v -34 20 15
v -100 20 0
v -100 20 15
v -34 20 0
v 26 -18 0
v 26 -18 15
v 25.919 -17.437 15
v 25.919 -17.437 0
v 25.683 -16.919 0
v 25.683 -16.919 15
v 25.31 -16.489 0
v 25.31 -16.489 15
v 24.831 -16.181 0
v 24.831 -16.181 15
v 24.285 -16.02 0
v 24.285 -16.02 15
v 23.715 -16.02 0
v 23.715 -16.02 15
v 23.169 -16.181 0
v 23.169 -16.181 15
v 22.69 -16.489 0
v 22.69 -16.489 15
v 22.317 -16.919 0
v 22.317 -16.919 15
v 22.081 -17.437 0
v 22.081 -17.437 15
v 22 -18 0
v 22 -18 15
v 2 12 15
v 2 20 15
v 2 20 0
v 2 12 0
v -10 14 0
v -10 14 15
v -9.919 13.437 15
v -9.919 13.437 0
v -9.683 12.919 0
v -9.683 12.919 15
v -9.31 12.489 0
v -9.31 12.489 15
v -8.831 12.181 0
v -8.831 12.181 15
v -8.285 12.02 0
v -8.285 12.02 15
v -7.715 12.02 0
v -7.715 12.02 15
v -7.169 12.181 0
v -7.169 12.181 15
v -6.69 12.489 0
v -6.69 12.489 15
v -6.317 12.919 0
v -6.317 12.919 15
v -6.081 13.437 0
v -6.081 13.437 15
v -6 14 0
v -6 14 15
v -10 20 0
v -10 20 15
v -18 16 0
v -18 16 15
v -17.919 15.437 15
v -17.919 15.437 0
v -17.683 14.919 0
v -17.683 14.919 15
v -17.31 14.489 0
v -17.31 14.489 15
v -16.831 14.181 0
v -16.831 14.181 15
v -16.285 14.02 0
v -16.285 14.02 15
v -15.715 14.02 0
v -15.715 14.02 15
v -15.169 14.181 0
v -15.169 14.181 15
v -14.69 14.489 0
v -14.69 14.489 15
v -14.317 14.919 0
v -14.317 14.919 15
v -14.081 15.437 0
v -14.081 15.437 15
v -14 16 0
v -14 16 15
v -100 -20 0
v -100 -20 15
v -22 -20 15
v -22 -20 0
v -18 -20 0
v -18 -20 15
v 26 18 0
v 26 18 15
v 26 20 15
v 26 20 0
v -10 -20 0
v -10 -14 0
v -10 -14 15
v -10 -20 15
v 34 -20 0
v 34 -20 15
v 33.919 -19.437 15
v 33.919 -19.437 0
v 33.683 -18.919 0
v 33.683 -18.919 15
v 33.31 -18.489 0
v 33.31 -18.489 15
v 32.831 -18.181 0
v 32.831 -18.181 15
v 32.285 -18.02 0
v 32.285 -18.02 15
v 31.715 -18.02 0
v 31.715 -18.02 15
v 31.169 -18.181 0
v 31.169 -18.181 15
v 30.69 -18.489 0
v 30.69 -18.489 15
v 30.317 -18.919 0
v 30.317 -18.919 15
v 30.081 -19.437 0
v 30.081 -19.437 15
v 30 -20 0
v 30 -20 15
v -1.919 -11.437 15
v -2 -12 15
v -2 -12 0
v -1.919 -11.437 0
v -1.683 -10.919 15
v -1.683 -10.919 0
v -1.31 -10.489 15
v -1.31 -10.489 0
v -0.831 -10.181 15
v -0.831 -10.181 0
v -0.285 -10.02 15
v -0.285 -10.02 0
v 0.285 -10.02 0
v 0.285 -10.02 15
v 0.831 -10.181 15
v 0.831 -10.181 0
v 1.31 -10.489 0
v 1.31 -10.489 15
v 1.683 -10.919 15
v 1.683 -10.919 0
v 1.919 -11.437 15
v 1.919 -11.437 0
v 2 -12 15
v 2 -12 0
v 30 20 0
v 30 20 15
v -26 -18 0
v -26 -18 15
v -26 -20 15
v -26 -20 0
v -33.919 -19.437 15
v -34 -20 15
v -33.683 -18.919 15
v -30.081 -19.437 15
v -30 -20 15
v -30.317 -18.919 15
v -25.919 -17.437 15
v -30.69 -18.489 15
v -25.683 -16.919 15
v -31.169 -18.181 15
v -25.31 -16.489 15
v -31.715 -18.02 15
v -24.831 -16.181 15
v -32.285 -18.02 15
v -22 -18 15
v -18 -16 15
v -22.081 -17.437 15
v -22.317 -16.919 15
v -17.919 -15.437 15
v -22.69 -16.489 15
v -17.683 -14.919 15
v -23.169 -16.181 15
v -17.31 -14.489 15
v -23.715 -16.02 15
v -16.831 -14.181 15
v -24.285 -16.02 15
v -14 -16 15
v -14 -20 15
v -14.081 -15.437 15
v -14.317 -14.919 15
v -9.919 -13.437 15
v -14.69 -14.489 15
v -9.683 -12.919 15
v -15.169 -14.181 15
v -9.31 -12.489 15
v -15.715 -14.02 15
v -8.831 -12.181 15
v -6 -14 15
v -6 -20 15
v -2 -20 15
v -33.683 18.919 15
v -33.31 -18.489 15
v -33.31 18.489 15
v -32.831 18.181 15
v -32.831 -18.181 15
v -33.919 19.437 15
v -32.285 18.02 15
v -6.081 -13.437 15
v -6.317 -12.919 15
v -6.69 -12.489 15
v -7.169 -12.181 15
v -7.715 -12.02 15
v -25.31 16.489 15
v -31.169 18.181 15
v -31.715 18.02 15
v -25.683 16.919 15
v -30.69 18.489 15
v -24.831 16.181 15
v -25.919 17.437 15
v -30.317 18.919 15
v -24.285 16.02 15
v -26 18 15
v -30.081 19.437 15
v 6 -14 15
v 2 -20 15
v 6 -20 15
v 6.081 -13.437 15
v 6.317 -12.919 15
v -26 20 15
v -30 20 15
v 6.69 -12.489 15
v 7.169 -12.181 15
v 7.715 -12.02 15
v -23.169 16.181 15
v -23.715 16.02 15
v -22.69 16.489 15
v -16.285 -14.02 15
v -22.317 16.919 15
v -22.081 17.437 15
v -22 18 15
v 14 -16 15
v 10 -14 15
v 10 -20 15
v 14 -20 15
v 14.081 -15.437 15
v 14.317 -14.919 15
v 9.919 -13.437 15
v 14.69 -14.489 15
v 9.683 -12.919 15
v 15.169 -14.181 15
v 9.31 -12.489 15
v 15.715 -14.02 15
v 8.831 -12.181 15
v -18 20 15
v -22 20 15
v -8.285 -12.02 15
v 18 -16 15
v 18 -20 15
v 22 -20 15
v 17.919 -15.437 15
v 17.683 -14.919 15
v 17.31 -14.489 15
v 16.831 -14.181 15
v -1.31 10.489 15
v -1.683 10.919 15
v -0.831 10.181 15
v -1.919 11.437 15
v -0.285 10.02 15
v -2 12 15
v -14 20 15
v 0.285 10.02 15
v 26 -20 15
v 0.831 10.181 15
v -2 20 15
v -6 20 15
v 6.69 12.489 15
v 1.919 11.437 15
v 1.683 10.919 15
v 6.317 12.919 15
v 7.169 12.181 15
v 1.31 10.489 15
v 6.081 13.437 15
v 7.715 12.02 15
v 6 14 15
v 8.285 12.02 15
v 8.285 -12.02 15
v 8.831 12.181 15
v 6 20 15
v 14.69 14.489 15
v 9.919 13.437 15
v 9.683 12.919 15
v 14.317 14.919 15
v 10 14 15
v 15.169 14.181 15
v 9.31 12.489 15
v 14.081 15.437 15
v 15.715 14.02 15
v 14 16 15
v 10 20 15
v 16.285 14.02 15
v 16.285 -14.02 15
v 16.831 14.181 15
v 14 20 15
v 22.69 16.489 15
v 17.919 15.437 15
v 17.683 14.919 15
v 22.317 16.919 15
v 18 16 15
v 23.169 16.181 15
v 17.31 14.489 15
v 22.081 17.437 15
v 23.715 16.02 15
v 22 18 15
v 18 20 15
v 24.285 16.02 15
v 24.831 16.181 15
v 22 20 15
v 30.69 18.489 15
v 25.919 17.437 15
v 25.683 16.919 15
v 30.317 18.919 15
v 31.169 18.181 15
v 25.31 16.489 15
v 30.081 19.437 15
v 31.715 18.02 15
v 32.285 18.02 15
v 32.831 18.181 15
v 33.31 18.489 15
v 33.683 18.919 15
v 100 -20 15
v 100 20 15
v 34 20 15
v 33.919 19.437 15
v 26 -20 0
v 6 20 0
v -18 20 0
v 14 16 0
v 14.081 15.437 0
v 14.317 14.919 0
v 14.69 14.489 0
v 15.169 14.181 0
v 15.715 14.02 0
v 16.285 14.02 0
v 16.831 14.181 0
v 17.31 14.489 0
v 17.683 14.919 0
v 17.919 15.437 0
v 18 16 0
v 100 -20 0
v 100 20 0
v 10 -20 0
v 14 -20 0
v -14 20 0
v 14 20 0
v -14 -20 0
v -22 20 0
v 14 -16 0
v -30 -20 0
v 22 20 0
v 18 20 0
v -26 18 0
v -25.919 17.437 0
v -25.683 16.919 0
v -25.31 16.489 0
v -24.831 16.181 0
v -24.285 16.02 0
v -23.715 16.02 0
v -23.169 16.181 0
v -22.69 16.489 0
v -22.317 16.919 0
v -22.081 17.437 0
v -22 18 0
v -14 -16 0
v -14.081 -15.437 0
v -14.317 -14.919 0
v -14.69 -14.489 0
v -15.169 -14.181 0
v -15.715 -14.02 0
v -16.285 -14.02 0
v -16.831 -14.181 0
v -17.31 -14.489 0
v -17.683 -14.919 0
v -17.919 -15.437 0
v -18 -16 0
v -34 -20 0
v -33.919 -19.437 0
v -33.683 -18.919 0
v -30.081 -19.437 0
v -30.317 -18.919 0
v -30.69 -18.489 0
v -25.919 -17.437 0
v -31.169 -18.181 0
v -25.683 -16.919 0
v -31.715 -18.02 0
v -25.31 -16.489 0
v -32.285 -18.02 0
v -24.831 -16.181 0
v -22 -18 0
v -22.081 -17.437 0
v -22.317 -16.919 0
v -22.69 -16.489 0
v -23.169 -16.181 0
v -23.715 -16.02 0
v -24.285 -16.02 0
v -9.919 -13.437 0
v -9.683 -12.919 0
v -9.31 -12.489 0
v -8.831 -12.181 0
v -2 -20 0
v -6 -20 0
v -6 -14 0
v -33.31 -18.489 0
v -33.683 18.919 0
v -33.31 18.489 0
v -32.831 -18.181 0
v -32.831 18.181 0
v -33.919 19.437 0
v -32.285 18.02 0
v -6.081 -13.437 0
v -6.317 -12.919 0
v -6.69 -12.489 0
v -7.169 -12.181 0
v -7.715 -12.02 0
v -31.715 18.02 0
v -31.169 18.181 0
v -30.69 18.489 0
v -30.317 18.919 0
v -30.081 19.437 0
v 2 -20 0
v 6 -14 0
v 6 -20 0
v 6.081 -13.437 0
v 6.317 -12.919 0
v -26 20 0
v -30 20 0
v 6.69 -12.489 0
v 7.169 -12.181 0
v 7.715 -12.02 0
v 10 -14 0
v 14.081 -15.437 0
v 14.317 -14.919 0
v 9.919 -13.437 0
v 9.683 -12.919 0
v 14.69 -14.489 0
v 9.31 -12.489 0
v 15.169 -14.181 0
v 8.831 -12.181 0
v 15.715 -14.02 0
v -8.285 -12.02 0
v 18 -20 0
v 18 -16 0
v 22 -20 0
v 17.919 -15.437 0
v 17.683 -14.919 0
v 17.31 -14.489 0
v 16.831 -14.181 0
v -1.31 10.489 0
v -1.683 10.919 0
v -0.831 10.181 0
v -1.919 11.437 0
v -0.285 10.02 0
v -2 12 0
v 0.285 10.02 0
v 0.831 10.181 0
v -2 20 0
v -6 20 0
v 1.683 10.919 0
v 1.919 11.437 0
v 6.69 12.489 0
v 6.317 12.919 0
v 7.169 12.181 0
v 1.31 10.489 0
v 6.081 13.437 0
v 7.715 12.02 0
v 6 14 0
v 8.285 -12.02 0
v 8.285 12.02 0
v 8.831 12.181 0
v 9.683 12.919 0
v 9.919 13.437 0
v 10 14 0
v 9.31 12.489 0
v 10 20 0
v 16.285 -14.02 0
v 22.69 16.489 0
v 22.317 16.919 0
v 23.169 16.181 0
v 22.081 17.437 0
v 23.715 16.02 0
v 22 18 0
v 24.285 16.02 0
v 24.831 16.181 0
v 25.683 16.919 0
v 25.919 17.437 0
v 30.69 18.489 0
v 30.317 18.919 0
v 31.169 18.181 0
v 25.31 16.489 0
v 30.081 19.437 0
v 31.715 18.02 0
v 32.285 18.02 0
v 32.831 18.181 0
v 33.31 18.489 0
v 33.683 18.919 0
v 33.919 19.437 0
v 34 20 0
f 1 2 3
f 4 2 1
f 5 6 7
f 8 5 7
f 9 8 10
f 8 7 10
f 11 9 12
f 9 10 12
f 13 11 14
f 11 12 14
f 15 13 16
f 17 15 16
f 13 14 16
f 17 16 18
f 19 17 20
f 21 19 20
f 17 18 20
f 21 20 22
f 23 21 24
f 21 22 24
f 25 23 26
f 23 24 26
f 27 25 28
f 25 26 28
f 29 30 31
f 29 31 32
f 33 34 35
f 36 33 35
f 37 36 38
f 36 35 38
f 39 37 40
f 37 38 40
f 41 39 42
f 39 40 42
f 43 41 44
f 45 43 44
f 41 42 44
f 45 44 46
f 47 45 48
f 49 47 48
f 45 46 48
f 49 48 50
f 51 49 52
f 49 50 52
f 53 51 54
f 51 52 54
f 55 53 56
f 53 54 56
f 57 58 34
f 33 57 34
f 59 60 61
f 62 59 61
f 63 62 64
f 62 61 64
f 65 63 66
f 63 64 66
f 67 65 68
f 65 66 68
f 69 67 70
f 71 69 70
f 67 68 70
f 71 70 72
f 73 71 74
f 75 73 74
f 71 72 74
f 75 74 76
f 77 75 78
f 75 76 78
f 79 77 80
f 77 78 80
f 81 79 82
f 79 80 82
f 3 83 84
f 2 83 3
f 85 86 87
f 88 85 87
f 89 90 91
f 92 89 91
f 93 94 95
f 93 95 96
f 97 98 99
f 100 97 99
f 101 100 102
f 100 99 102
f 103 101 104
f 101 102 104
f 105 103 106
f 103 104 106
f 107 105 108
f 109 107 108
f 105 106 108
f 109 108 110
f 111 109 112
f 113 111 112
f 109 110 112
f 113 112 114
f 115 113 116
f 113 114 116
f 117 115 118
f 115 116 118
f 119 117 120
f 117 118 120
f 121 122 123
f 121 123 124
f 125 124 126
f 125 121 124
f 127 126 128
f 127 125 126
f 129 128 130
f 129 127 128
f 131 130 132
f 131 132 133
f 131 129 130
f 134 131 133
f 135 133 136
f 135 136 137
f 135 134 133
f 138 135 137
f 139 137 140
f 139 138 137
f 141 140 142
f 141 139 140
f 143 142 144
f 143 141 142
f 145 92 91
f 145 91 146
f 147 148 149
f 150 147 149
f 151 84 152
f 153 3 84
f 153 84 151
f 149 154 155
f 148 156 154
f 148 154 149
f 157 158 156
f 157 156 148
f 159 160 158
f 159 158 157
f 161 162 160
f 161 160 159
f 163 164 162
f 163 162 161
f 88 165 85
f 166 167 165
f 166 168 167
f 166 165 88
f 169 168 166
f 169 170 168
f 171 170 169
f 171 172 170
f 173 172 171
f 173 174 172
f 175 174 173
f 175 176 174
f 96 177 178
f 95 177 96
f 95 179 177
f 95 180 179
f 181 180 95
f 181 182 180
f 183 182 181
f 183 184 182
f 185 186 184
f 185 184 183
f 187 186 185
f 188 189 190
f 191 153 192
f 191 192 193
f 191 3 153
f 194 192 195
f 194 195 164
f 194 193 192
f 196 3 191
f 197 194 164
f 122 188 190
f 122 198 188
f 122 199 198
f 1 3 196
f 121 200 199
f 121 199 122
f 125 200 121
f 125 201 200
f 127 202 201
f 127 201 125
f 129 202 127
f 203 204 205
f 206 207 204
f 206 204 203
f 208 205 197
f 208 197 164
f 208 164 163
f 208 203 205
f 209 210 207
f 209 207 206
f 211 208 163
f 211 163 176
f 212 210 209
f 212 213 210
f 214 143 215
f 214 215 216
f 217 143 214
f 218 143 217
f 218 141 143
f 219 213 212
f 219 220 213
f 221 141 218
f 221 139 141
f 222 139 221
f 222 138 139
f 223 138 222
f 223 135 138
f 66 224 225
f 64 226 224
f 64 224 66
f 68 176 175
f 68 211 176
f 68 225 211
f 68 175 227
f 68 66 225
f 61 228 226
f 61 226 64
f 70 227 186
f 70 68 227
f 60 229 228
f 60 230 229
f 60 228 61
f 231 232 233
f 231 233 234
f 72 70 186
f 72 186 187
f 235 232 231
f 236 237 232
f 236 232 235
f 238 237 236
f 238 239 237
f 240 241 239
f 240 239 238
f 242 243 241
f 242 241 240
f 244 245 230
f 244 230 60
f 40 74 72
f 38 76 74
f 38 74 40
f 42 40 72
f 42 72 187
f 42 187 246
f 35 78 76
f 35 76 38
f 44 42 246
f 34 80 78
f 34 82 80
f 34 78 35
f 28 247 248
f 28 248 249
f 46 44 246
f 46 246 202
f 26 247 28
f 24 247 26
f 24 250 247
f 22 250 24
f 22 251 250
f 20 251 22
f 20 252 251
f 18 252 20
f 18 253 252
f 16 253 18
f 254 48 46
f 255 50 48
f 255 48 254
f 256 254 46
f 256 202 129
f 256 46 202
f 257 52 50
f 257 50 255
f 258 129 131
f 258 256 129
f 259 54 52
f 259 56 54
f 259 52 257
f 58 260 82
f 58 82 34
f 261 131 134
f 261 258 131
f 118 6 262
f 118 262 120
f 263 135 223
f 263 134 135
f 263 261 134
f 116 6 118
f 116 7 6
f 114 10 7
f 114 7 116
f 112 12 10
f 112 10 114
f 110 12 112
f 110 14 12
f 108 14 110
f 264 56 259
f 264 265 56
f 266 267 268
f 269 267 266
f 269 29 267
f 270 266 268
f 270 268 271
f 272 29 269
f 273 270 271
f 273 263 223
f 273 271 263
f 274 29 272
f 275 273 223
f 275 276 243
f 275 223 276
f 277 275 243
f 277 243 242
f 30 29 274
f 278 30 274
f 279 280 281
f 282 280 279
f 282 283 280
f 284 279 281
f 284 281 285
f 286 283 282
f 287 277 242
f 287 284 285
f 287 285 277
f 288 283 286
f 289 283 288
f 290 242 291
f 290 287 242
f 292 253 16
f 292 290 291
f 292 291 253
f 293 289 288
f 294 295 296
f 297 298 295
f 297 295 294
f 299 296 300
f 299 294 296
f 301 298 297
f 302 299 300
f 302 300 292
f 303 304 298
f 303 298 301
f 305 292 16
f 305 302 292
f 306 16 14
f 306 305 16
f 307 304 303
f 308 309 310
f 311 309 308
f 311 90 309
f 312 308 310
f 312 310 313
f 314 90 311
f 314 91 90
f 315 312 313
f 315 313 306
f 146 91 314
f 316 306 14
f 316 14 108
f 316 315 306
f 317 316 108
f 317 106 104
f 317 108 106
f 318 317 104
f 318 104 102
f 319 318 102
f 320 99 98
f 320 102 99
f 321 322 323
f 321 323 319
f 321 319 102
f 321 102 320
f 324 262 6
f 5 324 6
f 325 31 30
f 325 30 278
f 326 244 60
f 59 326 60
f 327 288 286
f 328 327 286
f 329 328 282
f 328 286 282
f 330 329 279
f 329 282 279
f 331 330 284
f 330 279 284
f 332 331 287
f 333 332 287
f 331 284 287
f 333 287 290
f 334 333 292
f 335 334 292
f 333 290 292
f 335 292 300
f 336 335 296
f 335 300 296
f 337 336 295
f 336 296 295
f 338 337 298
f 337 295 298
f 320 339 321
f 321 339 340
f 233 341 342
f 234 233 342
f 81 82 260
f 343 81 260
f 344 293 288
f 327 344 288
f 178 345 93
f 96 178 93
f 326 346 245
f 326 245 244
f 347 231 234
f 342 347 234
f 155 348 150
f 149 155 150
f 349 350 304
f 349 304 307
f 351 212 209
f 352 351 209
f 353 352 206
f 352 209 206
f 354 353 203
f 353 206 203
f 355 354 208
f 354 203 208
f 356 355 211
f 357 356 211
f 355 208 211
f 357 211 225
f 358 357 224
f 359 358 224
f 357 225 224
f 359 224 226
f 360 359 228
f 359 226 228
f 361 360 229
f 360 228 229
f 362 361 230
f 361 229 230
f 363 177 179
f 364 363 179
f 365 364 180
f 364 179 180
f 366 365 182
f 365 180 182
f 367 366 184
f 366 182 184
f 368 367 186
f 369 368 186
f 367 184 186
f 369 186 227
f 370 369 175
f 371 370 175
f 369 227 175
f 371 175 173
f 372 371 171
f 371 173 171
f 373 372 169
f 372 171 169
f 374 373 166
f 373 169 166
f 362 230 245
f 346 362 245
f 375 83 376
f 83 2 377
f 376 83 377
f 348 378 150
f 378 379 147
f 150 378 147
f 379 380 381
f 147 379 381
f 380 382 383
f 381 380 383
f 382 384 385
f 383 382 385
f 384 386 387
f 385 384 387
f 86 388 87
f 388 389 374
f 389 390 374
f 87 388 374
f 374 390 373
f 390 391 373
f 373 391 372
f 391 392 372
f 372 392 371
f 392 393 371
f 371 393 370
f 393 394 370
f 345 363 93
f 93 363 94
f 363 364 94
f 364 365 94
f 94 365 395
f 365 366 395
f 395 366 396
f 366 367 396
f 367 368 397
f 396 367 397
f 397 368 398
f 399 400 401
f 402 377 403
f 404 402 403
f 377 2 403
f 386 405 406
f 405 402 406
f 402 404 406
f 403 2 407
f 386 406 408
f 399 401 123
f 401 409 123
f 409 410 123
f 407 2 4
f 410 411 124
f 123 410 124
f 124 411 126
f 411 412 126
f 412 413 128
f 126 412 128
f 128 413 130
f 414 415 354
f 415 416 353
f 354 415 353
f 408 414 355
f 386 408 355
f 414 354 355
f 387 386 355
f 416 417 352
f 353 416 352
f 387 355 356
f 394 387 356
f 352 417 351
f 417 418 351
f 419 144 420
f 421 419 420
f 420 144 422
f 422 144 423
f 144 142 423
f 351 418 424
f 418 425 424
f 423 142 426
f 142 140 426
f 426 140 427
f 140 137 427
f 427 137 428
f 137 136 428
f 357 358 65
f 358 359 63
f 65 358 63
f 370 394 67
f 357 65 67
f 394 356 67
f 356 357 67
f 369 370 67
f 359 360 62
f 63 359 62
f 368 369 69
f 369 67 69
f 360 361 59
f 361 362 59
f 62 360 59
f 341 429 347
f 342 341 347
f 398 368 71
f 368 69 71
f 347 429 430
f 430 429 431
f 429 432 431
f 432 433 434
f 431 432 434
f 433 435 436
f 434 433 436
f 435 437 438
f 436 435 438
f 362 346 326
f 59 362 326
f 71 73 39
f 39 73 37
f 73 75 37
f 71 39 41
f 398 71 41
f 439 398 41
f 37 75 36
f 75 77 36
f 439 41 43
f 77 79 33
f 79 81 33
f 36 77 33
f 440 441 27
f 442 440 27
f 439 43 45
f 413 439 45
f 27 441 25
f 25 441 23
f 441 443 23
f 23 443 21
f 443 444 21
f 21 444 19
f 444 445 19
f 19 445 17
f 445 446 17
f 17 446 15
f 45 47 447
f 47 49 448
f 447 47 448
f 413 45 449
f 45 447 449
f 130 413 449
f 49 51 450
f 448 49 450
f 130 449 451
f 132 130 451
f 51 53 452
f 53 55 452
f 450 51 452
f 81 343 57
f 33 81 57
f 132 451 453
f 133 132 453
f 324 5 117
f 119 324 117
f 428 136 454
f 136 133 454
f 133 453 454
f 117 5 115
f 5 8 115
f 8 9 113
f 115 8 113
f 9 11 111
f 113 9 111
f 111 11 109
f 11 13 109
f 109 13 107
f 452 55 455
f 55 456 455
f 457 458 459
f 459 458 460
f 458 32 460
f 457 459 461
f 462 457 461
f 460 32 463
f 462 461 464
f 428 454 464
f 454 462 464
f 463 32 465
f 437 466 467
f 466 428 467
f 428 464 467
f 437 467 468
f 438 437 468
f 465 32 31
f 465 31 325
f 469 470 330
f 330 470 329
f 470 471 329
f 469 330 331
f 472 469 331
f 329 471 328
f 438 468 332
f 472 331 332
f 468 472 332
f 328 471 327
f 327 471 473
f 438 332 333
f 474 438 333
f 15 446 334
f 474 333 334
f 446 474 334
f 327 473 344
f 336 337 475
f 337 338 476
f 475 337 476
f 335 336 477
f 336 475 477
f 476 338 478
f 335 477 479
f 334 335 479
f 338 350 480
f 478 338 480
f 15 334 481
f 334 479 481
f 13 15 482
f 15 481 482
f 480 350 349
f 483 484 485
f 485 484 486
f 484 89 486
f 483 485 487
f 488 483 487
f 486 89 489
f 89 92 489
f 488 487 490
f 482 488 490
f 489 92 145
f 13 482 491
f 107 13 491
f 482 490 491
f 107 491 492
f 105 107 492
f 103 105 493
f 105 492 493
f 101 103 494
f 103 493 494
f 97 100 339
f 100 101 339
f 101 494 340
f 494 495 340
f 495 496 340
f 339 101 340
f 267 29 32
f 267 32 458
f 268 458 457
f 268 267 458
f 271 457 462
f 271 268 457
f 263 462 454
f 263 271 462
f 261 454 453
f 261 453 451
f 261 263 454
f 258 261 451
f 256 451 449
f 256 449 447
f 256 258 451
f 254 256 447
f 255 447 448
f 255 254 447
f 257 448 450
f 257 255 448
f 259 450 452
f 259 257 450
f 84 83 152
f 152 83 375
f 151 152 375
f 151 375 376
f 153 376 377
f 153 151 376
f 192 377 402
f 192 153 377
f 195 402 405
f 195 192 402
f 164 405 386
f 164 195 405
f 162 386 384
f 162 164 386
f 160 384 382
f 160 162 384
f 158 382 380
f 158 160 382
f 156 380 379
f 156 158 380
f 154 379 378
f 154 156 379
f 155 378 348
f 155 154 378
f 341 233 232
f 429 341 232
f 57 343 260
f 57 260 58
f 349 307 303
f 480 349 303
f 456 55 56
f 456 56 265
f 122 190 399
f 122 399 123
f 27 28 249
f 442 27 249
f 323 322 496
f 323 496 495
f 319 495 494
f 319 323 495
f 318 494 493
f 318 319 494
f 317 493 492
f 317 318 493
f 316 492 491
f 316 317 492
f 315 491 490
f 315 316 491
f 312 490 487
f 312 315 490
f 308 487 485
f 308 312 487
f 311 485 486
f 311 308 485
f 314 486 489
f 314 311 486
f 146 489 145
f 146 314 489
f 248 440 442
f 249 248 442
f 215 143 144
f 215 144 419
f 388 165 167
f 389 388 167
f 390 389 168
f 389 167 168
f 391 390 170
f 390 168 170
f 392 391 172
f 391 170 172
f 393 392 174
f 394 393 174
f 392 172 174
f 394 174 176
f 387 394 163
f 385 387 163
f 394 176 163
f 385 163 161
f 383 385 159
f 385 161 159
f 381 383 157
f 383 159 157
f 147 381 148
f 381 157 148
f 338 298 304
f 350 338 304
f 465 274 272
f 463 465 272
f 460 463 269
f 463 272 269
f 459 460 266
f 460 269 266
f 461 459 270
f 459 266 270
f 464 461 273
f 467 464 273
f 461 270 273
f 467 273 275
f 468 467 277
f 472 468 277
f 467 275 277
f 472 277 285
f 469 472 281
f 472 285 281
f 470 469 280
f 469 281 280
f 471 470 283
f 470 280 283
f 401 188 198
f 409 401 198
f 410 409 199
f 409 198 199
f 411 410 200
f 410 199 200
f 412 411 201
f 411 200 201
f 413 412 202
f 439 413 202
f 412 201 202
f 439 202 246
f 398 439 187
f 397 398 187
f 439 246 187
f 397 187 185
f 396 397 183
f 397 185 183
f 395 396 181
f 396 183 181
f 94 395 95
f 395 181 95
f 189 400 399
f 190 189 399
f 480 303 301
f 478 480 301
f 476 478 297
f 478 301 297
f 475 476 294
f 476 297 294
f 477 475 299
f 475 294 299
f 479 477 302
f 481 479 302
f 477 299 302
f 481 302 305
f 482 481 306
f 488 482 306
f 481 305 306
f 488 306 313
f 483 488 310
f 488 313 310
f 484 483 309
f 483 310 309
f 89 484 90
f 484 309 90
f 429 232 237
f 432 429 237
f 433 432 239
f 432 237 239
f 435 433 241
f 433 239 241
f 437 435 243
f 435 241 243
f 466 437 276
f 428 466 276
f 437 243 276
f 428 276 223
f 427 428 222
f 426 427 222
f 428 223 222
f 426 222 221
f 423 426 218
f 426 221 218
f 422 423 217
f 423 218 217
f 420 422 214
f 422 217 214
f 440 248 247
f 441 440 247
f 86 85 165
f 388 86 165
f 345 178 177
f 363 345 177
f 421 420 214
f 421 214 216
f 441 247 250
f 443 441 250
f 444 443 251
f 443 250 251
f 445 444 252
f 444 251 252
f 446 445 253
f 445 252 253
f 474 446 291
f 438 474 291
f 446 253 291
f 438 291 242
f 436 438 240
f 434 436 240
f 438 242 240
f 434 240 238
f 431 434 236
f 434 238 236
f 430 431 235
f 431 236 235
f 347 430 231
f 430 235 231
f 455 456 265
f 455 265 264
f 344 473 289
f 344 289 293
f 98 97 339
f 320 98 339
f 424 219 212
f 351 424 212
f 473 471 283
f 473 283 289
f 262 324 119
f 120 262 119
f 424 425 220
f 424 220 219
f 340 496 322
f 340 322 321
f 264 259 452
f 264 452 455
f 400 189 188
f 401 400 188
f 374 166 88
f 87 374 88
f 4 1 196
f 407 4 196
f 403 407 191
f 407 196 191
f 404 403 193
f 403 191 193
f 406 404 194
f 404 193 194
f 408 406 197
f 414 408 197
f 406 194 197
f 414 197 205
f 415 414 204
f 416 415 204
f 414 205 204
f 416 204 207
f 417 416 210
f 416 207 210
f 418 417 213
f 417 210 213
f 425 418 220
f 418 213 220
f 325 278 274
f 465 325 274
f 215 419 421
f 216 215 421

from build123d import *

# Parameters (mm, degrees)
SKETCH1_W                                = 200
SKETCH1_H                                = 40
RECTANGULAR_BAR_40_W_X_200_L_X_15D_DEPTH = 15
NOTCH_CUT_OUT_DEPTH                      = 15
CUT_EXTRUDE1_DEPTH                       = 16


with BuildPart() as part:
    # Sketch1 → Rectangular Bar (40 W x 200 L x 15D) (new body)
    with BuildSketch(Plane.XY):
        Rectangle(SKETCH1_W, SKETCH1_H)
    extrude(amount=RECTANGULAR_BAR_40_W_X_200_L_X_15D_DEPTH)

    # Notch → Notch cut out (cut)
    with BuildSketch(Plane.XY.offset(15)):
        with BuildLine():
            Line((2, 20), (2, 12))
            ThreePointArc((2, 12), (0, 10), (-2, 12))
            Line((-2, 12), (-2, 20))
            Line((-2, 20), (2, 20))
        make_face()
        with BuildLine():
            Line((-2, -20), (-2, -12))
            ThreePointArc((-2, -12), (0, -10), (2, -12))
            Line((2, -12), (2, -20))
            Line((2, -20), (-2, -20))
        make_face()
    extrude(amount=-NOTCH_CUT_OUT_DEPTH, mode=Mode.SUBTRACT)

    # Sketch2 → Cut-Extrude1 (cut, through all)
    with BuildSketch(Plane.XY.offset(15)):
        with BuildLine():
            Line((6, 20), (6, 14))
            ThreePointArc((6, 14), (8, 12), (10, 14))
            Line((10, 14), (10, 20))
            Line((10, 20), (6, 20))
        make_face()
        with BuildLine():
            Line((14, 20), (14, 16))
            ThreePointArc((14, 16), (16, 14), (18, 16))
            Line((18, 16), (18, 20))
            Line((18, 20), (14, 20))
        make_face()
        with BuildLine():
            Line((22, 20), (22, 18))
            ThreePointArc((22, 18), (24, 16), (26, 18))
            Line((26, 18), (26, 20))
            Line((26, 20), (22, 20))
        make_face()
        with BuildLine():
            Line((30, 20), (34, 20))
            ThreePointArc((34, 20), (32, 18), (30, 20))
        make_face()
        with BuildLine():
            Line((-30, 20), (-34, 20))
            ThreePointArc((-34, 20), (-32, 18), (-30, 20))
        make_face()
        with BuildLine():
            Line((-22, 20), (-26, 20))
            Line((-26, 20), (-26, 18))
            ThreePointArc((-26, 18), (-24, 16), (-22, 18))
            Line((-22, 18), (-22, 20))
        make_face()
        with BuildLine():
            Line((-18, 20), (-18, 16))
            ThreePointArc((-18, 16), (-16, 14), (-14, 16))
            Line((-14, 16), (-14, 20))
            Line((-14, 20), (-18, 20))
        make_face()
        with BuildLine():
            Line((-10, 20), (-10, 14))
            ThreePointArc((-10, 14), (-8, 12), (-6, 14))
            Line((-6, 14), (-6, 20))
            Line((-6, 20), (-10, 20))
        make_face()
        with BuildLine():
            Line((30, -20), (34, -20))
            ThreePointArc((34, -20), (32, -18), (30, -20))
        make_face()
        with BuildLine():
            Line((26, -20), (26, -18))
            ThreePointArc((26, -18), (24, -16), (22, -18))
            Line((22, -18), (22, -20))
            Line((22, -20), (26, -20))
        make_face()
        with BuildLine():
            Line((18, -20), (18, -16))
            ThreePointArc((18, -16), (16, -14), (14, -16))
            Line((14, -16), (14, -20))
            Line((14, -20), (18, -20))
        make_face()
        with BuildLine():
            Line((10, -20), (10, -14))
            ThreePointArc((10, -14), (8, -12), (6, -14))
            Line((6, -14), (6, -20))
            Line((6, -20), (10, -20))
        make_face()
        with BuildLine():
            Line((-6, -20), (-6, -14))
            ThreePointArc((-6, -14), (-8, -12), (-10, -14))
            Line((-10, -14), (-10, -20))
            Line((-10, -20), (-6, -20))
        make_face()
        with BuildLine():
            Line((-14, -20), (-14, -16))
            ThreePointArc((-14, -16), (-16, -14), (-18, -16))
            Line((-18, -16), (-18, -20))
            Line((-18, -20), (-14, -20))
        make_face()
        with BuildLine():
            Line((-30, -20), (-34, -20))
            ThreePointArc((-34, -20), (-32, -18), (-30, -20))
        make_face()
        with BuildLine():
            Line((-22, -20), (-22, -18))
            ThreePointArc((-22, -18), (-24, -16), (-26, -18))
            Line((-26, -18), (-26, -20))
            Line((-26, -20), (-22, -20))
        make_face()
    extrude(amount=-CUT_EXTRUDE1_DEPTH, mode=Mode.SUBTRACT)


solid = part.part
